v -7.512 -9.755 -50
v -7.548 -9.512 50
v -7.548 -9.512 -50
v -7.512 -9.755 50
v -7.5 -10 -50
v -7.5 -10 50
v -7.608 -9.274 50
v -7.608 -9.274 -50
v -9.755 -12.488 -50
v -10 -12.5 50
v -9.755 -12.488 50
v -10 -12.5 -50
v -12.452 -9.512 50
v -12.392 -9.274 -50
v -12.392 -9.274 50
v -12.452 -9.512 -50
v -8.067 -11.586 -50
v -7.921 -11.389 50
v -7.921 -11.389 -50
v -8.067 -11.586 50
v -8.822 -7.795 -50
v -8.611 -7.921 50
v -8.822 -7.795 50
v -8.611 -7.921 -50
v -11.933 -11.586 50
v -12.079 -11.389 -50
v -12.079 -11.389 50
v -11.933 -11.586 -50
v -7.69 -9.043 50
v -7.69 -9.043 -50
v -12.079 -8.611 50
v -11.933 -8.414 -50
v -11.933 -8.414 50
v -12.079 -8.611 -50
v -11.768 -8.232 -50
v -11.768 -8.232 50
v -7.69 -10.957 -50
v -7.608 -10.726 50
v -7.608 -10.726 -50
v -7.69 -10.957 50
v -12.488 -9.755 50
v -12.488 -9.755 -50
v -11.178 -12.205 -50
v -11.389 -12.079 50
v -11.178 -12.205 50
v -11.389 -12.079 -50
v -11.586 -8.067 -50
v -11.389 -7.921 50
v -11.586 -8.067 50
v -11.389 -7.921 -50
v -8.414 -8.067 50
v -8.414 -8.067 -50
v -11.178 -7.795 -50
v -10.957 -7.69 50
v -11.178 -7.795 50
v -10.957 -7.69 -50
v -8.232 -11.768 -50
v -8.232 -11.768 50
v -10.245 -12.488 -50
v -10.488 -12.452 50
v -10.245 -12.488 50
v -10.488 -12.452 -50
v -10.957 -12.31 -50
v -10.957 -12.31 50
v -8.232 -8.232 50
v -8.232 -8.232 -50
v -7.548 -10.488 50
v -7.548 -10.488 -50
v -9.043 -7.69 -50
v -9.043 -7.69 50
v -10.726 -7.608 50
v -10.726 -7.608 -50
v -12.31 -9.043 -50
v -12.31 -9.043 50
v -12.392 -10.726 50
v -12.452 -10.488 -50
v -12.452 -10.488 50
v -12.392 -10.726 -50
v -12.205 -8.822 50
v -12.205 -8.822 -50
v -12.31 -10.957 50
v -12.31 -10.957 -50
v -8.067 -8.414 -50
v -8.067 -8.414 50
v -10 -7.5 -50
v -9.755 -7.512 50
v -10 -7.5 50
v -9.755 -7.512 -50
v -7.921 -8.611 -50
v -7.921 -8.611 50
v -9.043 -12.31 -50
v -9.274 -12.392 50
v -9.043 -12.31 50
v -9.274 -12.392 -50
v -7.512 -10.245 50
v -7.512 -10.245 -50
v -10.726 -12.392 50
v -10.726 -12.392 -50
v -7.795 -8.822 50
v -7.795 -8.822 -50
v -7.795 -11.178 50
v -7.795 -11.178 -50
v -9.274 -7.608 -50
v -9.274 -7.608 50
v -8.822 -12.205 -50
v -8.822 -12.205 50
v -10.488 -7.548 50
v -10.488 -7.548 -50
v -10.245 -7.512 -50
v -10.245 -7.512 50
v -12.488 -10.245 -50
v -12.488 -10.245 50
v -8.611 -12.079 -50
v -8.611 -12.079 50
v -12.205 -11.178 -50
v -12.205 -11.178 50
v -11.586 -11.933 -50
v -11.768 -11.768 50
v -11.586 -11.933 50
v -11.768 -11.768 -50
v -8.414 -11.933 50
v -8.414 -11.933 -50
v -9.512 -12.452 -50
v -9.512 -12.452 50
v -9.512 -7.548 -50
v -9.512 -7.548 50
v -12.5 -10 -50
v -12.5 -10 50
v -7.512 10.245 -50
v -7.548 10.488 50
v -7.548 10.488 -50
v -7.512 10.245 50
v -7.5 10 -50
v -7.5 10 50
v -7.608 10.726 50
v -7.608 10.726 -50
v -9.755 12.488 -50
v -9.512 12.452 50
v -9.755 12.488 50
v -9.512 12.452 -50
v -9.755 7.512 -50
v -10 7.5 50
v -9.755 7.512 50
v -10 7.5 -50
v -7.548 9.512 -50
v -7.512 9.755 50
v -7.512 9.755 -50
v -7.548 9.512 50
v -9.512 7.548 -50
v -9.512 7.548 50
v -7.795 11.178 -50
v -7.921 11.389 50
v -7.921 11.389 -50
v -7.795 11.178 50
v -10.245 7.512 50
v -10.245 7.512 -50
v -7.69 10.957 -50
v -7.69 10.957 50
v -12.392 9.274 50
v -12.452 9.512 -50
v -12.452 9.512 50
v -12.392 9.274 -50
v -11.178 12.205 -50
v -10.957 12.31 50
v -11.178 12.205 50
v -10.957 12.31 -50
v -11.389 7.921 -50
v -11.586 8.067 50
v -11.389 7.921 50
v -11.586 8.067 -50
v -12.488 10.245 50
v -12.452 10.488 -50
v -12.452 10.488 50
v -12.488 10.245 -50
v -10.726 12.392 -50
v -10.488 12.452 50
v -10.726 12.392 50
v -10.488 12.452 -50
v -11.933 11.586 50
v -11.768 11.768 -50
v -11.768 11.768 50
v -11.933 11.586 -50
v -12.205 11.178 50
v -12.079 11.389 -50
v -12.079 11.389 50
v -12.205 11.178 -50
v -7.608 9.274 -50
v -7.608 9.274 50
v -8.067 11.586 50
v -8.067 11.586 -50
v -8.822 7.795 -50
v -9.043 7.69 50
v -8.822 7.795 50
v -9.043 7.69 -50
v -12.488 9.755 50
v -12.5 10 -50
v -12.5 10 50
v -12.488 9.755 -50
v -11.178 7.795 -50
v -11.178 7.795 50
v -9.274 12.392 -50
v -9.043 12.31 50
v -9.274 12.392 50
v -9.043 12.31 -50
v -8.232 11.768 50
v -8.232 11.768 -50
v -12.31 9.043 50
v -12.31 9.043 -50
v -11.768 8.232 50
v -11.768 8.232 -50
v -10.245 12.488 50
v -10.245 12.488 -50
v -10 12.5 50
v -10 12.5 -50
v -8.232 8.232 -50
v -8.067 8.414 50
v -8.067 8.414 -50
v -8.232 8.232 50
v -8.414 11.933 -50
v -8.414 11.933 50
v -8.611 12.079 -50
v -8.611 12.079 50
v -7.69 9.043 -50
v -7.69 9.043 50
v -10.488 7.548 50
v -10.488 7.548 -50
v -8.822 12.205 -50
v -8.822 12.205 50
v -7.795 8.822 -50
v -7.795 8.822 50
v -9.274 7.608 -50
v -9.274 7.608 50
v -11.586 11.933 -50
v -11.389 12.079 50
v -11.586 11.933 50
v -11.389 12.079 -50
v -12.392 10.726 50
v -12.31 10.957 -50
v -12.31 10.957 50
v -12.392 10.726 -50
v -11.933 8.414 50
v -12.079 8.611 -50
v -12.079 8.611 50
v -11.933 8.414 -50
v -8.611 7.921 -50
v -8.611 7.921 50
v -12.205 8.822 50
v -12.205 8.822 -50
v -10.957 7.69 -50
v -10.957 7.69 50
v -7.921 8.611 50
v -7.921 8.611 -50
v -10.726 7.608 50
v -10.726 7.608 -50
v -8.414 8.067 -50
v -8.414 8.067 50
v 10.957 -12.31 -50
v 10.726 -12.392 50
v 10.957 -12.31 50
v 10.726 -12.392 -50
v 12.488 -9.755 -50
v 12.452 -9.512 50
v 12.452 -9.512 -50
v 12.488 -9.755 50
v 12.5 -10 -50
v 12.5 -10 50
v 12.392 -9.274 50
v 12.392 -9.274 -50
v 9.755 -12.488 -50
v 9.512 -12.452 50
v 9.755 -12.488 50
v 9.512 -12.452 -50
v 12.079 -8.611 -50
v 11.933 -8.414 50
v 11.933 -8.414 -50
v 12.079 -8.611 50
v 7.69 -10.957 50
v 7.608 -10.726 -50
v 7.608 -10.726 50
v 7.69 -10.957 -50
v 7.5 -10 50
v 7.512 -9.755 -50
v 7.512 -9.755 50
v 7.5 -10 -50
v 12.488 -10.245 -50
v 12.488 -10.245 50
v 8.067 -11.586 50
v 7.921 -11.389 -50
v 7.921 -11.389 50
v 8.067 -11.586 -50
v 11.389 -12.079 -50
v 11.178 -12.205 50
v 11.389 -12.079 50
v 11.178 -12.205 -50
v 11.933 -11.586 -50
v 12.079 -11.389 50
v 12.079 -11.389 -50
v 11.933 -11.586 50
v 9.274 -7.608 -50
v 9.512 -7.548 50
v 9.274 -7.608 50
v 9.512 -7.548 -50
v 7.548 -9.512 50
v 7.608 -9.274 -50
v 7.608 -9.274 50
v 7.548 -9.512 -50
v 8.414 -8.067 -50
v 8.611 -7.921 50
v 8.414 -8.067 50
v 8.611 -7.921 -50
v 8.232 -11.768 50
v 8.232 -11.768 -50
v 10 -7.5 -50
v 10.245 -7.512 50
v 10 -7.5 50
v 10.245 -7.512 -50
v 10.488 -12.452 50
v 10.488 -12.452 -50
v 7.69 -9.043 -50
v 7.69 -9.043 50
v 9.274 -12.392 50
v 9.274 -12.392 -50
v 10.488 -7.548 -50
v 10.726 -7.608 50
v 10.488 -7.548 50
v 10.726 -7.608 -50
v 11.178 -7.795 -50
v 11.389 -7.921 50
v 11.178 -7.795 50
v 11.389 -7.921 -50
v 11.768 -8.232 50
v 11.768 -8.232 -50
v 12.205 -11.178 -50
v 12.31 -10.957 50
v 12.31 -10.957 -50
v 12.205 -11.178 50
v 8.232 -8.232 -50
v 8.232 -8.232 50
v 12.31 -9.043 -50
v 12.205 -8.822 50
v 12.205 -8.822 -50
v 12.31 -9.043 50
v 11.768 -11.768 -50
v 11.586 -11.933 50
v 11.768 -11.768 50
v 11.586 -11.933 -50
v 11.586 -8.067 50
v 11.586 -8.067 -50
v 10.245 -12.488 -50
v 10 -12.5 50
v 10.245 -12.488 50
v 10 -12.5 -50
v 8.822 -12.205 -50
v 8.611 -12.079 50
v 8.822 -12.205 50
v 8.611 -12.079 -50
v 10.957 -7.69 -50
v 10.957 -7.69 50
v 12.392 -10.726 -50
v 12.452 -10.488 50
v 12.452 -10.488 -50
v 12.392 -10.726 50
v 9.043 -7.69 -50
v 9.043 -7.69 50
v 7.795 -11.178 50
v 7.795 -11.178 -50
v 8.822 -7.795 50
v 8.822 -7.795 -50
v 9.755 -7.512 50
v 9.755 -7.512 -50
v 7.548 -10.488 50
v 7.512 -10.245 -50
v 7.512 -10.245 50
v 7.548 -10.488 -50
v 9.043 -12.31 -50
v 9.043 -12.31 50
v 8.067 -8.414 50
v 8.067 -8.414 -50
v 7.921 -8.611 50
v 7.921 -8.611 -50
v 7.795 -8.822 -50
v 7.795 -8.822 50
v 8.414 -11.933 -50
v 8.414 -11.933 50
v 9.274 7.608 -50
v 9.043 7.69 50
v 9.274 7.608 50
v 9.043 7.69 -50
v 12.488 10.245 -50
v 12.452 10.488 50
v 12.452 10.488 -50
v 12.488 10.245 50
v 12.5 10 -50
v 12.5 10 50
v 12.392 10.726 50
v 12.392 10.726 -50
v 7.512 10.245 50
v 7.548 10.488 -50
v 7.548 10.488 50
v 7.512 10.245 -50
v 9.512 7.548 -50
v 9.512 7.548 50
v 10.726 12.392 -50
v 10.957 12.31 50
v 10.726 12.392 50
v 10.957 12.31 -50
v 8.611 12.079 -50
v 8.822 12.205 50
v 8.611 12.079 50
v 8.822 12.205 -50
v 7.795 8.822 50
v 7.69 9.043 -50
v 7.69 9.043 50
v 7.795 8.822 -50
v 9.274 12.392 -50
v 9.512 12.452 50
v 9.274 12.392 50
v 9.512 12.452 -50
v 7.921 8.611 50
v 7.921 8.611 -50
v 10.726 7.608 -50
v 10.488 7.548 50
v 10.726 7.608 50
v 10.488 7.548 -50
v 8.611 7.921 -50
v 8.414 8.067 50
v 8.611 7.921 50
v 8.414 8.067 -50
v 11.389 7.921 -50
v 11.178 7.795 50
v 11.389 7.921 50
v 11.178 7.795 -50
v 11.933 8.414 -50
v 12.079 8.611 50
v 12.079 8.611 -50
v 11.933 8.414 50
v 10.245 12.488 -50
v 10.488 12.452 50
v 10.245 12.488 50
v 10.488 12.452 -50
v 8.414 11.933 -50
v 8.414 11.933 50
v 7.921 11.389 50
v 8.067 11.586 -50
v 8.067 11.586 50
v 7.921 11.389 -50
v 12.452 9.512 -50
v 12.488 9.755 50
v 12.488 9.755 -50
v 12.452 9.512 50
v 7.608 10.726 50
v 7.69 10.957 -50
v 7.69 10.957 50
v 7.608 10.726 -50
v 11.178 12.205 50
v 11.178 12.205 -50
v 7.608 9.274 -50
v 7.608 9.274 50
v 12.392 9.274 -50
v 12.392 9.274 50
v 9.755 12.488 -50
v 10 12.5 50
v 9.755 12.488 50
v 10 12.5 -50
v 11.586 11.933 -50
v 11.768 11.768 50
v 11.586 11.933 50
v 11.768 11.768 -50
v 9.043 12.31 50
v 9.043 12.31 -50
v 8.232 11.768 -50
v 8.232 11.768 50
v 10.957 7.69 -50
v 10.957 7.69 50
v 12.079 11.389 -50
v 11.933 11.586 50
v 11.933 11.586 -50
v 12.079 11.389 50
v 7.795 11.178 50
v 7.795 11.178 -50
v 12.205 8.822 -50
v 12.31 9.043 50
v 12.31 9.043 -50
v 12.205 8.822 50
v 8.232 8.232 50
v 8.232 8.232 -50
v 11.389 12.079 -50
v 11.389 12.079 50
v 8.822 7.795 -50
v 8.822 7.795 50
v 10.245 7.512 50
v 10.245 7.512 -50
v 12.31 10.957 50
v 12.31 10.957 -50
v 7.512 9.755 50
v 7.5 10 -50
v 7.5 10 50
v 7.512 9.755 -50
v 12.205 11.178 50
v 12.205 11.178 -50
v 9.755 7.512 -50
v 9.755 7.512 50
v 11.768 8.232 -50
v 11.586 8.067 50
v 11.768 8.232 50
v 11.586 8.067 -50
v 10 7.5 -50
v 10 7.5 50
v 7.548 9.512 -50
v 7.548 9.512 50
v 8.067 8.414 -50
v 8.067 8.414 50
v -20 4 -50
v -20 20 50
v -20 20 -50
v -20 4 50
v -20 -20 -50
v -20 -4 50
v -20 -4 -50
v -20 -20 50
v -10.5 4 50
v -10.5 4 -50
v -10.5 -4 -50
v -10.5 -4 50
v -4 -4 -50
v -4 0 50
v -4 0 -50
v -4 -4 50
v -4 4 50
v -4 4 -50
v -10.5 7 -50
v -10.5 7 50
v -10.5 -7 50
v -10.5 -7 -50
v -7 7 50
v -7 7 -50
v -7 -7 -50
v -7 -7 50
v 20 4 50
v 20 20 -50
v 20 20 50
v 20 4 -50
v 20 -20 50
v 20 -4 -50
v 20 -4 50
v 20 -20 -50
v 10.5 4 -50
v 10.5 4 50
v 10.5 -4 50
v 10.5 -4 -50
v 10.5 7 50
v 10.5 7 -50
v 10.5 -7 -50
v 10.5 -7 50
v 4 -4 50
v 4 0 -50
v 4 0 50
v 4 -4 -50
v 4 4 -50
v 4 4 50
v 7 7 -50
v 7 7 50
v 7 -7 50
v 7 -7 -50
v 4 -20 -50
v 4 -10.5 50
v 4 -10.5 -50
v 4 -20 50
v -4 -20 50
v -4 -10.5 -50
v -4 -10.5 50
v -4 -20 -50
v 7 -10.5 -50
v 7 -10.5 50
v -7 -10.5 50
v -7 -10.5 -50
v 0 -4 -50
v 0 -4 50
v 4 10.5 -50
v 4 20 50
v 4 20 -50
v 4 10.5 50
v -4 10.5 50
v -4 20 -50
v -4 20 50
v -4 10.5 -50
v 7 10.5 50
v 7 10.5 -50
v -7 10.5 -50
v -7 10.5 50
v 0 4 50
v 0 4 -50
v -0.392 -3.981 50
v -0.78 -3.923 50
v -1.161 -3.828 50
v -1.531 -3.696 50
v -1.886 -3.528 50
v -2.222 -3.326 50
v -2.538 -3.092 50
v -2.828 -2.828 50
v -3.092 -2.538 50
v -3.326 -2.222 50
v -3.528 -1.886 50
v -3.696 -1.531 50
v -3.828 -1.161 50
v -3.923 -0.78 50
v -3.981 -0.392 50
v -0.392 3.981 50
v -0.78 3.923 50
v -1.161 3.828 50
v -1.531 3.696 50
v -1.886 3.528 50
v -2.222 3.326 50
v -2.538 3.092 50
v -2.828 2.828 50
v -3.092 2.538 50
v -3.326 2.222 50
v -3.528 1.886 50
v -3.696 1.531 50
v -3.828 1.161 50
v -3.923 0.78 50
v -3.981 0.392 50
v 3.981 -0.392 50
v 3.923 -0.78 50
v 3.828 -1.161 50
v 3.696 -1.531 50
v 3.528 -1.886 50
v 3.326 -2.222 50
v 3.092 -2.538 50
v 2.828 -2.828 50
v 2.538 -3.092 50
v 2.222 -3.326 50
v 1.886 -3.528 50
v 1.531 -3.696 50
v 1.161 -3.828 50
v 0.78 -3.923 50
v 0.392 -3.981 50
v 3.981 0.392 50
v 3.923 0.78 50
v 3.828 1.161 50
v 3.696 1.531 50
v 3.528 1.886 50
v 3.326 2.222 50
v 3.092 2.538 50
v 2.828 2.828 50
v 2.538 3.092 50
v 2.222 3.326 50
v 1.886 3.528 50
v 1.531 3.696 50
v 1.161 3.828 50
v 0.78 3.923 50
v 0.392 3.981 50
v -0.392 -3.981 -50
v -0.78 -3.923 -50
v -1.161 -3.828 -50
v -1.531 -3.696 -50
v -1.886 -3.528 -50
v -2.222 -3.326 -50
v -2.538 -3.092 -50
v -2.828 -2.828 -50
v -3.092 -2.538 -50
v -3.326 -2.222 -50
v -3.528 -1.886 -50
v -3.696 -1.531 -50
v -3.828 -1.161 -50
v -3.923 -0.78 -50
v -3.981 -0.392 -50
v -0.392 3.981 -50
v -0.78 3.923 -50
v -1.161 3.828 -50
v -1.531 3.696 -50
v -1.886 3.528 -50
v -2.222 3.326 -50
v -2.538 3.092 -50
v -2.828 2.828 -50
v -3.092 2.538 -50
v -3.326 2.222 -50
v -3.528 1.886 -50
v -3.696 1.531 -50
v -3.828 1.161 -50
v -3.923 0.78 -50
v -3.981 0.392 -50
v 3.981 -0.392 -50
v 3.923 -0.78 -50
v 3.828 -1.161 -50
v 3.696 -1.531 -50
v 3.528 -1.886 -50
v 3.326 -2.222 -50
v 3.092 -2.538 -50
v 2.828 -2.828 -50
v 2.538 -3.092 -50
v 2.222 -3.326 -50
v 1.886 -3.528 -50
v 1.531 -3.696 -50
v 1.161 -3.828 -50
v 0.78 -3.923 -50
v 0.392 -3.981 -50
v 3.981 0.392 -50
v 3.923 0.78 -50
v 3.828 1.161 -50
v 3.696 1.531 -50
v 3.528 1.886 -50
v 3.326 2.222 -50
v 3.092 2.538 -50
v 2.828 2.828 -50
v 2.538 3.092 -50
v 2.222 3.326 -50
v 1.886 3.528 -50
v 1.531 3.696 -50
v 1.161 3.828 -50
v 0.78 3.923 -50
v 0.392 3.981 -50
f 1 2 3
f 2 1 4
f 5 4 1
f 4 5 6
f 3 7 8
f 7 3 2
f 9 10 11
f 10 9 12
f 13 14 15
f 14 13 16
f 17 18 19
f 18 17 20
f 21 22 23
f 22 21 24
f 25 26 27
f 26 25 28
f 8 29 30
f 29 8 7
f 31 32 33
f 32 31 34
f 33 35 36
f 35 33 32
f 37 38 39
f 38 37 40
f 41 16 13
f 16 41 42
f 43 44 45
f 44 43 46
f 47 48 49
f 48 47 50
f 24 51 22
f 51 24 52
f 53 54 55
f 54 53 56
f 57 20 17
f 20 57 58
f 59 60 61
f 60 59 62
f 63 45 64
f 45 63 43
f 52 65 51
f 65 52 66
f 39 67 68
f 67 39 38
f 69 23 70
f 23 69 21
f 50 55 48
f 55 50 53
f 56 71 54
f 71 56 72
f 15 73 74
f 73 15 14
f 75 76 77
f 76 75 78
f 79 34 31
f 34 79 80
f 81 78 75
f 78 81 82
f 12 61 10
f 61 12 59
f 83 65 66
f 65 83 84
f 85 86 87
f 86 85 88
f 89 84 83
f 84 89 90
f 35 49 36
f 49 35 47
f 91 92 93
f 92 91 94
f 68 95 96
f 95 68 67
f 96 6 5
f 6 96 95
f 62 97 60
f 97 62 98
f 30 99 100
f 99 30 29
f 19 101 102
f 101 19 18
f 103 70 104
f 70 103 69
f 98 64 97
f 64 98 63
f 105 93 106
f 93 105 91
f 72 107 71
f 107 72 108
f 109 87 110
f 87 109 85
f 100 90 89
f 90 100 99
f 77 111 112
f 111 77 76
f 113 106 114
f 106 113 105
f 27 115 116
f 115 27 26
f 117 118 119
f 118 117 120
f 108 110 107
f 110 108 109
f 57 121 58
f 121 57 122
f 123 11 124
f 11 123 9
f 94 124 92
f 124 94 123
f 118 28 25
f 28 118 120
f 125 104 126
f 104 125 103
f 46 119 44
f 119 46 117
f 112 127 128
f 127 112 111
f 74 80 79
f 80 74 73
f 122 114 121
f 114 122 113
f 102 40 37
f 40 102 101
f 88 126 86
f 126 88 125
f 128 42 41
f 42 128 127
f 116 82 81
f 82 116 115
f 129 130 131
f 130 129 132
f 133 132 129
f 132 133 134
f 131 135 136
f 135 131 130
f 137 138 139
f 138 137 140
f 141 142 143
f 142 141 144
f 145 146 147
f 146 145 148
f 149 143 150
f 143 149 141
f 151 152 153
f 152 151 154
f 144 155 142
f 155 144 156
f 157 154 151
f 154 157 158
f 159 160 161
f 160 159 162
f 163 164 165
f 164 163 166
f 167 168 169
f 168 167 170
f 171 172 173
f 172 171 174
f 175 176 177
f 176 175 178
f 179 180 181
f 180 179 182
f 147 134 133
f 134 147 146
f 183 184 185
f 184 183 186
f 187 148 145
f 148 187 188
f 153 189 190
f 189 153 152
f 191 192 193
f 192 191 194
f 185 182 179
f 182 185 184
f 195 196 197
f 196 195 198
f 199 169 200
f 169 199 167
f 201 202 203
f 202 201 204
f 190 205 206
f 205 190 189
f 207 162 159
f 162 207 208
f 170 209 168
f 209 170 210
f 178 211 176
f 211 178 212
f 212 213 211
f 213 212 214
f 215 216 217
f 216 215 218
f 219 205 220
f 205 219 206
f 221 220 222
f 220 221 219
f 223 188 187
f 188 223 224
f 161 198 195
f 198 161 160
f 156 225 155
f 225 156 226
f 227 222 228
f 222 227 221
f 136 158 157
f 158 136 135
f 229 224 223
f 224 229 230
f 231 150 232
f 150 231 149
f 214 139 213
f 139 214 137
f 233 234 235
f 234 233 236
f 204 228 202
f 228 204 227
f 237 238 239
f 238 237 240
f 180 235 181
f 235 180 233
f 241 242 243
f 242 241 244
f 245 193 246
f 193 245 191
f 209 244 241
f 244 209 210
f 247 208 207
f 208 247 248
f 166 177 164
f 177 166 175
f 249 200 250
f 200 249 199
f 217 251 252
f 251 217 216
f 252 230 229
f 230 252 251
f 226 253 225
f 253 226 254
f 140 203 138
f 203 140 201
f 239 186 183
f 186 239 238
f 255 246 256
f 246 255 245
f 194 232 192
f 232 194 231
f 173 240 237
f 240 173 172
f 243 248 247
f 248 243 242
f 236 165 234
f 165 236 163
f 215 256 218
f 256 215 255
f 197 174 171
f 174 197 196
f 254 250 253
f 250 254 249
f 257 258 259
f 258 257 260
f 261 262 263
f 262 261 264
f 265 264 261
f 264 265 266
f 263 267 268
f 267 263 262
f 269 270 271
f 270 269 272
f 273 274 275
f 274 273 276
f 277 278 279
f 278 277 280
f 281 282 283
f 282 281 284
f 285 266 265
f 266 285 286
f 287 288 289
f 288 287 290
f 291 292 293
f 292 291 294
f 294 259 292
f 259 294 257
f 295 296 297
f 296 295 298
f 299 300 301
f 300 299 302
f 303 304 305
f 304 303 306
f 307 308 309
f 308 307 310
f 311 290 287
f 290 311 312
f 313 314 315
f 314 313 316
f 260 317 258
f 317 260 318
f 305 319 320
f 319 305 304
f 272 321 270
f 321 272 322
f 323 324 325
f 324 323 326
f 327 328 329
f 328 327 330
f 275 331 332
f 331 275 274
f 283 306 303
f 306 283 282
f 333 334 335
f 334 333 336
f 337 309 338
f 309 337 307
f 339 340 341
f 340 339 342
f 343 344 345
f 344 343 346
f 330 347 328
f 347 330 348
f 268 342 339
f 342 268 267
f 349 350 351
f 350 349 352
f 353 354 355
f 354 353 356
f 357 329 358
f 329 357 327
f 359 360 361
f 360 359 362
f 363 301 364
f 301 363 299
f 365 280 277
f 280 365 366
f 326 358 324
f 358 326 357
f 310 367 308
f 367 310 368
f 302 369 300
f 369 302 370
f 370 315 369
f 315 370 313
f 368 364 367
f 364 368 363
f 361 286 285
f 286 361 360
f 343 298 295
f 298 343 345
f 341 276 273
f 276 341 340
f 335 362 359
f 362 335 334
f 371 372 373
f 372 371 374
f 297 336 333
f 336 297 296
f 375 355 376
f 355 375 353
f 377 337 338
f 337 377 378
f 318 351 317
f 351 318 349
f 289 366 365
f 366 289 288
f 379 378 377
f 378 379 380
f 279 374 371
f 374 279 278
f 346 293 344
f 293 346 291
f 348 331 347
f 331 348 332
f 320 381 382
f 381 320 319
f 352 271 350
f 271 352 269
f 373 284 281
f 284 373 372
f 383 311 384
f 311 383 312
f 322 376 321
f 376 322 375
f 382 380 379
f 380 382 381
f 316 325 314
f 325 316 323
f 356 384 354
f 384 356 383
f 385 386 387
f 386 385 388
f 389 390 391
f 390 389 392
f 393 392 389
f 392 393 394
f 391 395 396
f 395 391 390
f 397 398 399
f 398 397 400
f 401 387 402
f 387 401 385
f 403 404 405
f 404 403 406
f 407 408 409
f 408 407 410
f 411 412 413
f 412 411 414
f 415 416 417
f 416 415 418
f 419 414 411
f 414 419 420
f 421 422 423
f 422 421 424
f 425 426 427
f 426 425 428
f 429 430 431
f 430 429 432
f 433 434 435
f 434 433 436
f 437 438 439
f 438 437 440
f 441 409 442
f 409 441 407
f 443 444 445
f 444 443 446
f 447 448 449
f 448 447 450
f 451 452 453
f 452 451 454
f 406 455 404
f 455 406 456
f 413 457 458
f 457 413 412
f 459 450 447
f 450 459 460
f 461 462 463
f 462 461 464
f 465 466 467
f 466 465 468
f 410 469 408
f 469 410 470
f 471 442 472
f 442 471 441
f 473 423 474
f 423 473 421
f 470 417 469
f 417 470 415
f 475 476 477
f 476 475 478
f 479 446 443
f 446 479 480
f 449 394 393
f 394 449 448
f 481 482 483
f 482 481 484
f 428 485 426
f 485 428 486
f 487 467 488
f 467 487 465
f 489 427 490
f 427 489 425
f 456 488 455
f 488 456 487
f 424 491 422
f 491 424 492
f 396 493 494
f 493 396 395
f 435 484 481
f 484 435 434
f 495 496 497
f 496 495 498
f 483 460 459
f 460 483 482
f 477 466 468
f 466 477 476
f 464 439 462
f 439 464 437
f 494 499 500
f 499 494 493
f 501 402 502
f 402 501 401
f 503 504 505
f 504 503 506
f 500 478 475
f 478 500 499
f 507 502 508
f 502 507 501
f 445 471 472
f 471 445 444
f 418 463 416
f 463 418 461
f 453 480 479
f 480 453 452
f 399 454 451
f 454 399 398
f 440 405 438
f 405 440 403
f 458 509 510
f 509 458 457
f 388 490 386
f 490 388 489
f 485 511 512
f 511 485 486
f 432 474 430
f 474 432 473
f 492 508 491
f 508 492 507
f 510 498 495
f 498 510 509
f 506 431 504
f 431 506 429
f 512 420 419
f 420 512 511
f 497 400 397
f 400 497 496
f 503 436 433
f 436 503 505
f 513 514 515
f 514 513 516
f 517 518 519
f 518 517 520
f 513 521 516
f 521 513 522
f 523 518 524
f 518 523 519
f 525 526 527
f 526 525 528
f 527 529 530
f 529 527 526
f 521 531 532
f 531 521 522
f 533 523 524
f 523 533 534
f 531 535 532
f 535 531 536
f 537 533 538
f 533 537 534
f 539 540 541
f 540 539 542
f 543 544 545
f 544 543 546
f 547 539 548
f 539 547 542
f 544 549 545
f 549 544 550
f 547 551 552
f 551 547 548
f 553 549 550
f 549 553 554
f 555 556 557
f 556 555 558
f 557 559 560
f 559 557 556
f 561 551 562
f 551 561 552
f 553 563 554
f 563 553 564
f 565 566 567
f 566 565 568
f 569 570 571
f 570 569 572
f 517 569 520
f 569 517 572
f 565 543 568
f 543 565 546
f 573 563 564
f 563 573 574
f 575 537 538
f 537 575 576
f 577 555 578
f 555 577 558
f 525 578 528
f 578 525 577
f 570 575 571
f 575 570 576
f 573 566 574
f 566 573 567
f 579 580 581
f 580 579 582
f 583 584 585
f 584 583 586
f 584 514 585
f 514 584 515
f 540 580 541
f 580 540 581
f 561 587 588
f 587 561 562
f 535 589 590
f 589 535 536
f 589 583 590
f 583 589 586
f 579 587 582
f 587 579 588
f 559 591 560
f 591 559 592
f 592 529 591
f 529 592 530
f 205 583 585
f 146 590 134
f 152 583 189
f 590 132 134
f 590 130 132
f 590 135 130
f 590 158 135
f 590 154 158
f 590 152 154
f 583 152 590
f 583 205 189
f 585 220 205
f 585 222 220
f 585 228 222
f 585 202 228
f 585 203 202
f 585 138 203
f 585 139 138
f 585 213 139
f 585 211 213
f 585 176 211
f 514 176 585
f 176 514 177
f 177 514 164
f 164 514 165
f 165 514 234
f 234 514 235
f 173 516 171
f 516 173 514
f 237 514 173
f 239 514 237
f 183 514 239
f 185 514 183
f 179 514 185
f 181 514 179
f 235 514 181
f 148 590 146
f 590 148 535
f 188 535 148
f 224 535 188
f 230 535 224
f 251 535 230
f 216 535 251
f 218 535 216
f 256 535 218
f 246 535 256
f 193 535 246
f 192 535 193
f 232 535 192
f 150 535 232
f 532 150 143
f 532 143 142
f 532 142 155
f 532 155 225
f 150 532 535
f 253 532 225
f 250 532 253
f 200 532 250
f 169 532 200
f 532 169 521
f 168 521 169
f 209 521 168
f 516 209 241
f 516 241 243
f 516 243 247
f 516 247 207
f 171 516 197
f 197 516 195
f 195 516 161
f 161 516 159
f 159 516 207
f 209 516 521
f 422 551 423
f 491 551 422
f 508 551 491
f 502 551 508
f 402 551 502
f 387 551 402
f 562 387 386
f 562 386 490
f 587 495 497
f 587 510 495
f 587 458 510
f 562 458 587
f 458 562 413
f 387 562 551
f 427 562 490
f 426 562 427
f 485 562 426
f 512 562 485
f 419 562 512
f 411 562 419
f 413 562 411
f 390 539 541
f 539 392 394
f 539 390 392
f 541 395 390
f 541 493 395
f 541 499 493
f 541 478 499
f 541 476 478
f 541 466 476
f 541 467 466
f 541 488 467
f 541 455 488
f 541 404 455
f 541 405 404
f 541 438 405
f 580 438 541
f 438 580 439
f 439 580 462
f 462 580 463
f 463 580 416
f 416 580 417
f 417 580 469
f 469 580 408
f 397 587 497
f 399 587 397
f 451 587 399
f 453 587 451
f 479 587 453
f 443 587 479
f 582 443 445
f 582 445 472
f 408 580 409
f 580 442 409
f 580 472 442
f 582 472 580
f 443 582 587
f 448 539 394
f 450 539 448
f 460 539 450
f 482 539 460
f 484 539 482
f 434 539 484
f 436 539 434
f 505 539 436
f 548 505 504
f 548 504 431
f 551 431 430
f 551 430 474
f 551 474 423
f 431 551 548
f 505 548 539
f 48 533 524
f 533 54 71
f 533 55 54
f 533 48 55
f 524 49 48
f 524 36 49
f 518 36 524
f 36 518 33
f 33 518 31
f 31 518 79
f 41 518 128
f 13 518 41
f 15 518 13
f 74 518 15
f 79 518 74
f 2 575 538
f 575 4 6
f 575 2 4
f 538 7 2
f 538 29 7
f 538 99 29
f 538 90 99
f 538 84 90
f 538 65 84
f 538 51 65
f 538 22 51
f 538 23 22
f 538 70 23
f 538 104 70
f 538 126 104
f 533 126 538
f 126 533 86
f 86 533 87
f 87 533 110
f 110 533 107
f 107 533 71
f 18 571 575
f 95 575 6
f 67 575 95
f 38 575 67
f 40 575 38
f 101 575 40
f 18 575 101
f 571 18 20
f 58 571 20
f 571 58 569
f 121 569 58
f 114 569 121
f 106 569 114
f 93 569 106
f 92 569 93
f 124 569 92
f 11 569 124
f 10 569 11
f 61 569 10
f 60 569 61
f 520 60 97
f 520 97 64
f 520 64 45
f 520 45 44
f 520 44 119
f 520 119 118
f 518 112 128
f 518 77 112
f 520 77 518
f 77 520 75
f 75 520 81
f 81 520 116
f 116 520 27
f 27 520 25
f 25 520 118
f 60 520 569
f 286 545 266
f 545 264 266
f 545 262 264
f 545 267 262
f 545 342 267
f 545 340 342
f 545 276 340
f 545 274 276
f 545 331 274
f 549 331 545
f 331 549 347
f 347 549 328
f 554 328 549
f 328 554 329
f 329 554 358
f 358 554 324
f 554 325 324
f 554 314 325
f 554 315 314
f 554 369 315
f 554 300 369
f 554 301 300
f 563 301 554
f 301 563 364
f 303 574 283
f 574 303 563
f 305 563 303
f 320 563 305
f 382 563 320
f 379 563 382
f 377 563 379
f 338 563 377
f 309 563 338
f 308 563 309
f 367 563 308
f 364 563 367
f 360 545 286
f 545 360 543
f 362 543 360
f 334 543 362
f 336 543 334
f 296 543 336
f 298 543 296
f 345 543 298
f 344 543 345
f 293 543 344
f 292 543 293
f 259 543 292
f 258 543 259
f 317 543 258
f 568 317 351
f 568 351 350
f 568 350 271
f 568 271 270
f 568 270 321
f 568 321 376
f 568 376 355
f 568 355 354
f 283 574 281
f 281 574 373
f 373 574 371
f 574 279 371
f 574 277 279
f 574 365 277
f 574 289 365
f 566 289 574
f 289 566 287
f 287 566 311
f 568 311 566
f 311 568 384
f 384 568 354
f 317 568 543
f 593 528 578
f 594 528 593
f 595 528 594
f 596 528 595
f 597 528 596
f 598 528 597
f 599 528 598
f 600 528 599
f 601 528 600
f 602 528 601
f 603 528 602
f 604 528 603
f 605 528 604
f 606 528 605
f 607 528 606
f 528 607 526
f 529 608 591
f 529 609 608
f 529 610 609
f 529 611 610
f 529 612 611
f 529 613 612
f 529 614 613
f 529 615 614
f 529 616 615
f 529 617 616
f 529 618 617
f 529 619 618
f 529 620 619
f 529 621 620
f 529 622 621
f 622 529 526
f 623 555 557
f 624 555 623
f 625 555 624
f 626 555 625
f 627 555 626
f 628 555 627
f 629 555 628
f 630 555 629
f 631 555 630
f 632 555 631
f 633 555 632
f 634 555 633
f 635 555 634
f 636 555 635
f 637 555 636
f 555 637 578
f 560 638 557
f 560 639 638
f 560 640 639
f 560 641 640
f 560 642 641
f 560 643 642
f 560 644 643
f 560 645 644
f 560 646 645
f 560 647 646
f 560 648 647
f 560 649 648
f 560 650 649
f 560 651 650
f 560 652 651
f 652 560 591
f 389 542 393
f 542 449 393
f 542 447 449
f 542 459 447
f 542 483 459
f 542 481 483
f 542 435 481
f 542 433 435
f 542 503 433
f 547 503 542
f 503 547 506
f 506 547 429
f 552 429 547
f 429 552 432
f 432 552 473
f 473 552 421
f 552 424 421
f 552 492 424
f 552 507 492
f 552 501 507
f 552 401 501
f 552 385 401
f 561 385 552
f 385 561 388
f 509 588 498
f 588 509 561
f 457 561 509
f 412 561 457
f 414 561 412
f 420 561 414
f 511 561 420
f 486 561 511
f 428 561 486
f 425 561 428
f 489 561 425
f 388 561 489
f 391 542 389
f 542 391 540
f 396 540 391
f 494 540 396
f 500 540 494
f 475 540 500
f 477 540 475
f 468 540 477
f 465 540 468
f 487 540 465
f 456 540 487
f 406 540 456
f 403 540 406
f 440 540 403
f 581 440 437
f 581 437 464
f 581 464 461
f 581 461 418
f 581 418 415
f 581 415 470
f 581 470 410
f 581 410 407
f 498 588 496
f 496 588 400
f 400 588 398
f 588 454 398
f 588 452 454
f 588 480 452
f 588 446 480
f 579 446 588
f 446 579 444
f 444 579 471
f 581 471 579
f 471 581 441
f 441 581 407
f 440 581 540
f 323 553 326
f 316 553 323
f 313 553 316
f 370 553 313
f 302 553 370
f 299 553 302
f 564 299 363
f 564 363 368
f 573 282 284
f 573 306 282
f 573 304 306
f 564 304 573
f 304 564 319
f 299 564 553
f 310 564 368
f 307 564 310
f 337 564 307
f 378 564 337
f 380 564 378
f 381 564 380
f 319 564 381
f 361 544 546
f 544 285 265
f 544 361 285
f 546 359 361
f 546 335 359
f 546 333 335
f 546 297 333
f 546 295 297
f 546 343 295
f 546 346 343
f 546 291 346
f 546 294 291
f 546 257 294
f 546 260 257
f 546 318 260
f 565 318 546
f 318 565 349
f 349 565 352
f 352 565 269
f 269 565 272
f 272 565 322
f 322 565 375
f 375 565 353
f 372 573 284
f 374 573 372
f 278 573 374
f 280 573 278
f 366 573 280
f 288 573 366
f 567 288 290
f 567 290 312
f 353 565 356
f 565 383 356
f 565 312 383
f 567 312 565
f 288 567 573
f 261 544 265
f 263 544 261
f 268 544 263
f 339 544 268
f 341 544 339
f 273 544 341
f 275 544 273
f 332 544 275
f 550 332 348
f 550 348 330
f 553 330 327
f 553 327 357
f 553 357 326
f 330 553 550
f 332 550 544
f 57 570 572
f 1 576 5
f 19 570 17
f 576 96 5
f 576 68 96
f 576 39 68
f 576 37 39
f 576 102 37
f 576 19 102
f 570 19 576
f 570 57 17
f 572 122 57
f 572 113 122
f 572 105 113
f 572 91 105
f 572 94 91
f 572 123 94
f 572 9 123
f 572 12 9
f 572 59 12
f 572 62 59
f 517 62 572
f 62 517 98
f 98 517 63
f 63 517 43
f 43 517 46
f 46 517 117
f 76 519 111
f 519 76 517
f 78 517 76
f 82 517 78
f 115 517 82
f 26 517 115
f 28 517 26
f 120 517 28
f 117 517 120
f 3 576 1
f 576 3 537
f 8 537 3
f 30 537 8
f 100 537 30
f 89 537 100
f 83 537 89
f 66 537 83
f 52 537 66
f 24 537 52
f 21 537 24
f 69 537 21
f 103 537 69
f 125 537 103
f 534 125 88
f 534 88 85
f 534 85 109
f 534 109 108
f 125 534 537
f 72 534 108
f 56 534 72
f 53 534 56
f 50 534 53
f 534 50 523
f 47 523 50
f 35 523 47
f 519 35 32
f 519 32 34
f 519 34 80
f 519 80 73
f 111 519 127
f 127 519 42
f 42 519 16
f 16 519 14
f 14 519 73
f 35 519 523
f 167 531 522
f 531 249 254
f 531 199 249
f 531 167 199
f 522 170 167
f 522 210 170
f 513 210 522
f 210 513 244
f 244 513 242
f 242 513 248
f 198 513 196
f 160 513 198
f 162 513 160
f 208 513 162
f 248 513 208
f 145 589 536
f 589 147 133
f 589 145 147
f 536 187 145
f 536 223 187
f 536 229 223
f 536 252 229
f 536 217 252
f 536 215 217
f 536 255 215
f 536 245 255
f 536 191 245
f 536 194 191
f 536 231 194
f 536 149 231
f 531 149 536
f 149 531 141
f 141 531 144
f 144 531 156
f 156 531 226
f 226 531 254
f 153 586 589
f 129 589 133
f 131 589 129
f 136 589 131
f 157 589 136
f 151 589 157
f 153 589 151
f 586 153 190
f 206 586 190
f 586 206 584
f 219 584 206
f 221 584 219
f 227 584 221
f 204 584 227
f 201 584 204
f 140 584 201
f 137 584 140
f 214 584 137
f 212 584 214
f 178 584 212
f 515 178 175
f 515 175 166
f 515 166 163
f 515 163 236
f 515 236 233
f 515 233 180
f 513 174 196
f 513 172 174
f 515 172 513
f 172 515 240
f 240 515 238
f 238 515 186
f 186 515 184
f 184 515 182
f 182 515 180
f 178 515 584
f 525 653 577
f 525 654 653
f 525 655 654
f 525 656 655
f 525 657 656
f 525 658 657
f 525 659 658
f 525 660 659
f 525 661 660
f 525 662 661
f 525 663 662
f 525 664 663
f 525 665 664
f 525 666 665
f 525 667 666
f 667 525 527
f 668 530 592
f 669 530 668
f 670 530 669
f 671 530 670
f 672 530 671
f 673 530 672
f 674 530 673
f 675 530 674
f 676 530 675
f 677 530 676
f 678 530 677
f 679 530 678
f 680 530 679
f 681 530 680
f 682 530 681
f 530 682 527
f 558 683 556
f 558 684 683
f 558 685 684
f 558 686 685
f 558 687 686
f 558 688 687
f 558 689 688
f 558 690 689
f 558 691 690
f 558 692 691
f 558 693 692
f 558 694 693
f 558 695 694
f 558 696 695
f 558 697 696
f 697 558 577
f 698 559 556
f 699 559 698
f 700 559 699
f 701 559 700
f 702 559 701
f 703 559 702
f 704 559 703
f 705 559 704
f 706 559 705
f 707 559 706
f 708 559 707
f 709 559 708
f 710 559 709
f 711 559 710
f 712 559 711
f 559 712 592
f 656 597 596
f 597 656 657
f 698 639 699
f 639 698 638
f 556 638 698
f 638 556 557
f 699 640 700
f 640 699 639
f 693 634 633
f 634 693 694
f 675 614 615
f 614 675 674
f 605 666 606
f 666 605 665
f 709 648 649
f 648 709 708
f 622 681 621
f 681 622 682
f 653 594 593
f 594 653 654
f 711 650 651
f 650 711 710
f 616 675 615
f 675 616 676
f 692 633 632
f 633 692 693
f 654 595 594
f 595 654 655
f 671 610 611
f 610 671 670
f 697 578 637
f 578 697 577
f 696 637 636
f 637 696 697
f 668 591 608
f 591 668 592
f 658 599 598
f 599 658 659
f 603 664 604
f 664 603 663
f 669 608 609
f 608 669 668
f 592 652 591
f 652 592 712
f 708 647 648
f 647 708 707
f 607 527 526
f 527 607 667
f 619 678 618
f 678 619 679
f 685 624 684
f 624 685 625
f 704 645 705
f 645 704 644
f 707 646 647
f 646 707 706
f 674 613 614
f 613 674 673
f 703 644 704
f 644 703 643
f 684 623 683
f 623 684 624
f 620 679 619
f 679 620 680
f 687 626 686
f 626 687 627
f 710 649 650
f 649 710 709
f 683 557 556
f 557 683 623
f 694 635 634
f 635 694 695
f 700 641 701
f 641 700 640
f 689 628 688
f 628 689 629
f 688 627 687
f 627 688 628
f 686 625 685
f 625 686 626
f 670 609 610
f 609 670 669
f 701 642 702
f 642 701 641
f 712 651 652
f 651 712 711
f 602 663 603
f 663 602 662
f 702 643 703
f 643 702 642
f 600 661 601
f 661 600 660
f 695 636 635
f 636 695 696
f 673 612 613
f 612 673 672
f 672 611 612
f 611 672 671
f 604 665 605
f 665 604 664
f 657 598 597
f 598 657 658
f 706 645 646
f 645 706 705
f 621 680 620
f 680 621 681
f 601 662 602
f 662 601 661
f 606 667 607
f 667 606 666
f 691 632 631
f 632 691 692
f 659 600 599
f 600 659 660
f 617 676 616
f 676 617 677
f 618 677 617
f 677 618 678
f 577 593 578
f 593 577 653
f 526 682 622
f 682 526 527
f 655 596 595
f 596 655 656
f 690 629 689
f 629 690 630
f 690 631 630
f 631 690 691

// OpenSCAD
// 40x40 aluminium extrusion profile, 100mm long (single connected solid)

// Parameters (fixed to requested size)
cross_section_width  = 40.0;
cross_section_height = 40.0;
length               = 100.0;

// Profile details
wall_thickness       = 3.0;
slot_opening_width   = 8.0;
slot_depth           = 10.0;
slot_cavity_width    = 14.0;
slot_cavity_depth    = 6.0;

center_bore_diameter = 8.0;
corner_bore_diameter = 5.0;
corner_bore_offset   = 10.0;

overlap              = 0.5;
$fn = 64;

module extrusion_4040(len=length) {
    // Guard against impossible geometry
    w  = cross_section_width;
    h  = cross_section_height;

    // Keep slots within the body
    sd  = min(slot_depth, min(w,h)/2 - wall_thickness);
    scd = min(slot_cavity_depth, sd);
    sow = min(slot_opening_width, min(w,h) - 2*wall_thickness);
    scw = min(slot_cavity_width,  min(w,h) - 2*wall_thickness);

    difference() {
        // Main body
        cube([w, h, len], center=true);

        // Center bore
        cylinder(d=center_bore_diameter, h=len + 2*overlap, center=true);

        // Corner bores
        for (sx = [-1, 1])
            for (sy = [-1, 1])
                translate([sx*(w/2 - corner_bore_offset),
                           sy*(h/2 - corner_bore_offset), 0])
                    cylinder(d=corner_bore_diameter, h=len + 2*overlap, center=true);

        // T-slots on +/-X faces
        for (sx = [-1, 1]) {
            // Opening (near outer face)
            translate([sx*(w/2 - (sd + overlap)/2), 0, 0])
                cube([sd + overlap, sow, len + 2*overlap], center=true);

            // Inner cavity (deeper inside)
            translate([sx*(w/2 - sd - (scd + overlap)/2 + overlap), 0, 0])
                cube([scd + overlap, scw, len + 2*overlap], center=true);
        }

        // T-slots on +/-Y faces
        for (sy = [-1, 1]) {
            translate([0, sy*(h/2 - (sd + overlap)/2), 0])
                cube([sow, sd + overlap, len + 2*overlap], center=true);

            translate([0, sy*(h/2 - sd - (scd + overlap)/2 + overlap), 0])
                cube([scw, scd + overlap, len + 2*overlap], center=true);
        }
    }
}

// Single connected solid only (no extra floating parts)
color("Silver") extrusion_4040(length);
